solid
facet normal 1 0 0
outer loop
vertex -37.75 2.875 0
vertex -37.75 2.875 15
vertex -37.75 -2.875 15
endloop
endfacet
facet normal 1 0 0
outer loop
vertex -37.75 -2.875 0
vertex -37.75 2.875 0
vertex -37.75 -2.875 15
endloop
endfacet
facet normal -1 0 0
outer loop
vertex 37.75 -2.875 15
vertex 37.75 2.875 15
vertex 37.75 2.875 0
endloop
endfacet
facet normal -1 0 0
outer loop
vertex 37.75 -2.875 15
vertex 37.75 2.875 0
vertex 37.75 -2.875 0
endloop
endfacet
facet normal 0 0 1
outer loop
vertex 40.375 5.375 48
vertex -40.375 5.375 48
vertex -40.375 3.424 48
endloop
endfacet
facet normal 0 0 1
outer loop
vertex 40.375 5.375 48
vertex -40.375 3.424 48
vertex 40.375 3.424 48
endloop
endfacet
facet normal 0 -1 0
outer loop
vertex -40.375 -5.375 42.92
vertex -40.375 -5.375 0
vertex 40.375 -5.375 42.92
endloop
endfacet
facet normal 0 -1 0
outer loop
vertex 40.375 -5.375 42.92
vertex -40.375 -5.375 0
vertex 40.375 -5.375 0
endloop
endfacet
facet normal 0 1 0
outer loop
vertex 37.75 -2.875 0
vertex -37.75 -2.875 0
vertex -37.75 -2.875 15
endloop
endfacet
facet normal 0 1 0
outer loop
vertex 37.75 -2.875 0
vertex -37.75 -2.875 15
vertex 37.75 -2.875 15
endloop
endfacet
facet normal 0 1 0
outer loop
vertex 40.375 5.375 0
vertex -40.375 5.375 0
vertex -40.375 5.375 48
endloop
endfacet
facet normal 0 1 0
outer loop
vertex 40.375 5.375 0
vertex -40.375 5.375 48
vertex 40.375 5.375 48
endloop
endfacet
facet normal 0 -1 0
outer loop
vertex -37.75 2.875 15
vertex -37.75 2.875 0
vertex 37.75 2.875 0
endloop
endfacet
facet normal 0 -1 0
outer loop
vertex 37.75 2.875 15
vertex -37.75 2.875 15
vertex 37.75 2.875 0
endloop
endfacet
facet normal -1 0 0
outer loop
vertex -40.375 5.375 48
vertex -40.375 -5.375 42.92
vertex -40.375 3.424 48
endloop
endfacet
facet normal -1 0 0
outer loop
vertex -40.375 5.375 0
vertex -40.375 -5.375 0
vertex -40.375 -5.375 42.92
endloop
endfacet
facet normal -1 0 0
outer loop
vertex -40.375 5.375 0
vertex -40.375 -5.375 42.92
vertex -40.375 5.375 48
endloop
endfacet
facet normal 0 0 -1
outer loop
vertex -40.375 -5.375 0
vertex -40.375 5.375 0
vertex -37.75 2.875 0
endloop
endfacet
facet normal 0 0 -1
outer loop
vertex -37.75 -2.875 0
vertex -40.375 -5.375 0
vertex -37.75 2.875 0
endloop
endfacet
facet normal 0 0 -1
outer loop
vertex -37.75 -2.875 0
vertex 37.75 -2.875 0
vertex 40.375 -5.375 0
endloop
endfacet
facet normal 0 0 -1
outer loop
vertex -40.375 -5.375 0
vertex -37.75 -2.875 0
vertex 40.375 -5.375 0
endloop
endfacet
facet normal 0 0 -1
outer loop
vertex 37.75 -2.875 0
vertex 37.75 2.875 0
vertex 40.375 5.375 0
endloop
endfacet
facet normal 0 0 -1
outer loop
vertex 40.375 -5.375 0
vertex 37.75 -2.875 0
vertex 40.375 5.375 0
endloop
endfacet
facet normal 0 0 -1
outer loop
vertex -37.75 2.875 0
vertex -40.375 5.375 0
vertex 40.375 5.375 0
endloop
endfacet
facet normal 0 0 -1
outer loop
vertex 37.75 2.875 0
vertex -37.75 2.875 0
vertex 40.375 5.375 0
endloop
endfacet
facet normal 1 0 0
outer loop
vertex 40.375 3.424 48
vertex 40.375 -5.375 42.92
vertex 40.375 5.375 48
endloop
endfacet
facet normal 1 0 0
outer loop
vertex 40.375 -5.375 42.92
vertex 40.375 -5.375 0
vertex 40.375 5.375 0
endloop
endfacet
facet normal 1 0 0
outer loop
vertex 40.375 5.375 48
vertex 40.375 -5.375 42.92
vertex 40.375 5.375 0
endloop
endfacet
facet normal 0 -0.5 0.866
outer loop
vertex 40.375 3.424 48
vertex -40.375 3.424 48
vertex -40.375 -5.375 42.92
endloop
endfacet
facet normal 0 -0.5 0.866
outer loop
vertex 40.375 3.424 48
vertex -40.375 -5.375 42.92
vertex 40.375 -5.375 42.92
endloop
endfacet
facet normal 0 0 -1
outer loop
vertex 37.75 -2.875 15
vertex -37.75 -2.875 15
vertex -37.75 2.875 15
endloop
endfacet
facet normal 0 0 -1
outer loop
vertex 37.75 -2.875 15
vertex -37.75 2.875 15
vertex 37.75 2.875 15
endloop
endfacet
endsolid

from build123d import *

# Parameters (mm, degrees)
F0_W     = 80.75
F0_H     = 10.75
F1_DEPTH = 48
F2_W     = 75.5
F2_H     = 5.75
F3_DEPTH = 15
F4_SIZE2 = 8.798818
F4_SIZE  = 5.08


with BuildPart() as f1:
    # F0 (on Top) → F1 (new body)
    with BuildSketch(Plane.XY):
        Rectangle(F0_W, F0_H)
    extrude(amount=F1_DEPTH)

    # F2 (on face) → F3 (cut)
    with BuildSketch(Plane(origin=(0, 0, 0), x_dir=(1, 0, 0), z_dir=(0, 0, -1))):
        Rectangle(F2_W, F2_H)
    extrude(amount=-F3_DEPTH, mode=Mode.SUBTRACT)

    # F4
    f4_edges = [f1.edges().sort_by_distance(p)[0] for p in [
        (0, -5.375, 48),
    ]]
    chamfer(f4_edges, length=F4_SIZE, length2=F4_SIZE2)


solid = f1.part
